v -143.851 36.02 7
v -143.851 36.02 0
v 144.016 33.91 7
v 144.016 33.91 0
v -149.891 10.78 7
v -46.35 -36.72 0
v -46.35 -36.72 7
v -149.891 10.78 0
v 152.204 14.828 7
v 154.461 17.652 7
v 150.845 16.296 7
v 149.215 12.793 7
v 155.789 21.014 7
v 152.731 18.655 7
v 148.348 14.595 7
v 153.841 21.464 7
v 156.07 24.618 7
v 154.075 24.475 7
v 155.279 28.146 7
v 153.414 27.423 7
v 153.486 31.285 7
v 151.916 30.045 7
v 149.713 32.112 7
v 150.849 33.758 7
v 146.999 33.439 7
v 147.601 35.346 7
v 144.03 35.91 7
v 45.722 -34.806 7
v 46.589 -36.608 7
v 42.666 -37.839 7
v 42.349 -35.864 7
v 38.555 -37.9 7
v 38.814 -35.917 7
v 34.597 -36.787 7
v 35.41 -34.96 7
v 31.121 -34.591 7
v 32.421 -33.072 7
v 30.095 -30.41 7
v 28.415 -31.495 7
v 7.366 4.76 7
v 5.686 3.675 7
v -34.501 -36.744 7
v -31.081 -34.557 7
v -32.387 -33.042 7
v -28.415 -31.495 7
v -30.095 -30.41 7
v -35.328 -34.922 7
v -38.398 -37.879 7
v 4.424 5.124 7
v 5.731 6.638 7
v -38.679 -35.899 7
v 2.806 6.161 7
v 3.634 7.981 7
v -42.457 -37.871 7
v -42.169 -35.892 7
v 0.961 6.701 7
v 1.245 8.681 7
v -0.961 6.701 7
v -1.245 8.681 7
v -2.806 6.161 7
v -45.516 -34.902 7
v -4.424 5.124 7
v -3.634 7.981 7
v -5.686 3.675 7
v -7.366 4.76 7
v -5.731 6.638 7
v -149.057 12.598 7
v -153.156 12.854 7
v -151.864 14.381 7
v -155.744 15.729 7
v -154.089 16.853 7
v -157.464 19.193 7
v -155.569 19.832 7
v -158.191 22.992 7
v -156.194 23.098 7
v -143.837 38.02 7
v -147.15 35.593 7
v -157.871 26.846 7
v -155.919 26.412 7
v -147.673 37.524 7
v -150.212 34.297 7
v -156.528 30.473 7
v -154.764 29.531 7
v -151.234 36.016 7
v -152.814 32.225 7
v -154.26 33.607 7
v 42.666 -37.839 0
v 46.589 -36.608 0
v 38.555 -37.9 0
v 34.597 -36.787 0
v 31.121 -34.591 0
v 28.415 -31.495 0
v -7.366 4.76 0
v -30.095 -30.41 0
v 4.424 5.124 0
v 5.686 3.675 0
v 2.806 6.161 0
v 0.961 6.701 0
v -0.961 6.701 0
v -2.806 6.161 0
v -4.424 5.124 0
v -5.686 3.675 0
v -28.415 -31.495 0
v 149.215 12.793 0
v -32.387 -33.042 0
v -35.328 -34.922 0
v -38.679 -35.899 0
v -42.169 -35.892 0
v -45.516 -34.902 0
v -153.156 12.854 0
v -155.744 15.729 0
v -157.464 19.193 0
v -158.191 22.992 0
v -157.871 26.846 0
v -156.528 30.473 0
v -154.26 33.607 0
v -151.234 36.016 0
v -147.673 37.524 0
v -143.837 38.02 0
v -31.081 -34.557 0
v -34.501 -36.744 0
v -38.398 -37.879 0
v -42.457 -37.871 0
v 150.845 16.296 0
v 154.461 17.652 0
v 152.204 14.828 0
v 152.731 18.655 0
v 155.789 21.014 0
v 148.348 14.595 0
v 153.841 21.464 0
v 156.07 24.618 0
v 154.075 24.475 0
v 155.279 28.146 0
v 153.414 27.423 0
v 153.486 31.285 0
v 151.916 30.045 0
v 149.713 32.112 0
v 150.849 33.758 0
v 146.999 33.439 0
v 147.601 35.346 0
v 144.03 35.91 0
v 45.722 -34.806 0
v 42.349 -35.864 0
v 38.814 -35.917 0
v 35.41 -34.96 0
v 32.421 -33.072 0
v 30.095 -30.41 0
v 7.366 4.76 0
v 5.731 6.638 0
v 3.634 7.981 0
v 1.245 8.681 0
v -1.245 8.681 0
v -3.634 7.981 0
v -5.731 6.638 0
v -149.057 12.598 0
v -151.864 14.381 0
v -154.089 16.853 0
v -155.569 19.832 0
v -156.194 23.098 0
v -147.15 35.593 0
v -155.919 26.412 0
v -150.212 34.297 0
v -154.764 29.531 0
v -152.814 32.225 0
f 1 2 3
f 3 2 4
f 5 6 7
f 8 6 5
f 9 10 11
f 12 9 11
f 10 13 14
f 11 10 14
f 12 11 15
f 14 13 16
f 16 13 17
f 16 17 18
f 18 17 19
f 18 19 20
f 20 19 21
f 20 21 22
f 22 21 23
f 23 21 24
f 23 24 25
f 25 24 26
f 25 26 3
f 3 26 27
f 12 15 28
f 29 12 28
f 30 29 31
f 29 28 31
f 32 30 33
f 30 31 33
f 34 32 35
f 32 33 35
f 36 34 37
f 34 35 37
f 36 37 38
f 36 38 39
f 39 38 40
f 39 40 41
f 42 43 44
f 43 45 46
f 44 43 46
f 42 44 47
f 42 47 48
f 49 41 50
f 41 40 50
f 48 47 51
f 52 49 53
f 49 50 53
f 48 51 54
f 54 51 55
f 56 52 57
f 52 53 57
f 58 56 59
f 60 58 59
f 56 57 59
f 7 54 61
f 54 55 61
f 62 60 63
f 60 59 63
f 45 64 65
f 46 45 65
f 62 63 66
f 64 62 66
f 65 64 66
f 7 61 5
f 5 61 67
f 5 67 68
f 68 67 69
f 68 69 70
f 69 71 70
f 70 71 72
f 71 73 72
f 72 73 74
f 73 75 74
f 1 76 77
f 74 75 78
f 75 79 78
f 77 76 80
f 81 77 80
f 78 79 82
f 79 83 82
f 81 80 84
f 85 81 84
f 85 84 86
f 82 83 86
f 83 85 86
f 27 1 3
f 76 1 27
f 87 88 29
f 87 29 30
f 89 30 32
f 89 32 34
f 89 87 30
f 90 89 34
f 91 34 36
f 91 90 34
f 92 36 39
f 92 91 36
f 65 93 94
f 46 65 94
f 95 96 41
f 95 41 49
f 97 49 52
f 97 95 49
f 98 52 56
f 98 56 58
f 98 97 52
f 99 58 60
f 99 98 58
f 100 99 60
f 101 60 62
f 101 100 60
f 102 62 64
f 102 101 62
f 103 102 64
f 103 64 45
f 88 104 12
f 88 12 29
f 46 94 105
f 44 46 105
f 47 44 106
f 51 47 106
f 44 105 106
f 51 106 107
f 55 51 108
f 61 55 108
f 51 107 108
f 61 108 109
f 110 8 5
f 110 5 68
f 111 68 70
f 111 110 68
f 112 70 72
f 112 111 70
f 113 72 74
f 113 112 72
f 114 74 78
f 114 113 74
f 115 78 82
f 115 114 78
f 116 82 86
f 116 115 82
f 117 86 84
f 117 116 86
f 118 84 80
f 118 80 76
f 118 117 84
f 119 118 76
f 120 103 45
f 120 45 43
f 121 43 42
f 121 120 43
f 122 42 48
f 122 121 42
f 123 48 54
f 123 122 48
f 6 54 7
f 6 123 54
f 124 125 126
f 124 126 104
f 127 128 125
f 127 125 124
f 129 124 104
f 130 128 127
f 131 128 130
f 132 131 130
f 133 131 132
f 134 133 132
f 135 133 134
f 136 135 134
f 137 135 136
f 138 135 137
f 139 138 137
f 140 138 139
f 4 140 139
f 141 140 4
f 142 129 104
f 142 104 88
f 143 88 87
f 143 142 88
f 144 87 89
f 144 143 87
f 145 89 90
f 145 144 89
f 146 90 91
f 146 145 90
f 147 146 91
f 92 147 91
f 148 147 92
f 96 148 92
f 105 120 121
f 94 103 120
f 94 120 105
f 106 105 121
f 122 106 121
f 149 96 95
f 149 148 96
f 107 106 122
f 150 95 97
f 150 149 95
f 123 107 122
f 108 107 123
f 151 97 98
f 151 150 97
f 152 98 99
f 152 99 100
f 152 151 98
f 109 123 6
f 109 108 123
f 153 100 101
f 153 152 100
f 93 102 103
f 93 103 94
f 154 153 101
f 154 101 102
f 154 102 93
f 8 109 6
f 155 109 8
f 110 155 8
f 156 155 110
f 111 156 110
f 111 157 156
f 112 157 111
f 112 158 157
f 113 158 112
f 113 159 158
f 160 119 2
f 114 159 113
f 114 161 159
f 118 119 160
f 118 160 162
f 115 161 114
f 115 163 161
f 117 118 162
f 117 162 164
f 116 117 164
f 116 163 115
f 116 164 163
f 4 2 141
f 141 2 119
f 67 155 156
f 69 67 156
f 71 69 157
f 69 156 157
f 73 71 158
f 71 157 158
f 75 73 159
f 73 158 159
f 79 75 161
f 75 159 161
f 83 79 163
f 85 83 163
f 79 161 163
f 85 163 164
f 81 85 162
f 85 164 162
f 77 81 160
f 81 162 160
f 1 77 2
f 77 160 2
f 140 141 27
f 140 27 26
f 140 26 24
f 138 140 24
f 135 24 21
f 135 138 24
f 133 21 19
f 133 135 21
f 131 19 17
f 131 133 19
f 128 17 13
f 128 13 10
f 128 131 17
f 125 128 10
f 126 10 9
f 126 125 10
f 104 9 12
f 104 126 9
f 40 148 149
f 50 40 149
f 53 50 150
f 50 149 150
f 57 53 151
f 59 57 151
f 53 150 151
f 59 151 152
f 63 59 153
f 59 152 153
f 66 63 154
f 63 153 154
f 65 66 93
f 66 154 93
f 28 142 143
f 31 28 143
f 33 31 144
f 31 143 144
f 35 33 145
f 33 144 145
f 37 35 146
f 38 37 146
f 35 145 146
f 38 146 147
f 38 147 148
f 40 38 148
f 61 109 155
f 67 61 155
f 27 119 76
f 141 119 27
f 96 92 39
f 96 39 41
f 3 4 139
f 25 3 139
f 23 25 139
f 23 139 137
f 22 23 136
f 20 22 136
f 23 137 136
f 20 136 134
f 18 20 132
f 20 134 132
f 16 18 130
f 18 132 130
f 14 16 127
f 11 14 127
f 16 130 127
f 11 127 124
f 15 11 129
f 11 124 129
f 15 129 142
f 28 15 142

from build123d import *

# Parameters (mm, degrees)
BOSS_EXTRUDE1_DEPTH = 7


with BuildPart() as part:
    # Sketch4 → Boss-Extrude1 (new body)
    with BuildSketch(Plane.XY):
        with BuildLine():
            Line((149.215463732, 12.793345832), (46.589393766, -36.607849916))
            ThreePointArc((46.589393766, -36.607849916), (36.535868579, -37.486862399), (28.414970428, -31.495448136))
            Line((28.414970428, -31.495448136), (5.685960057, 3.674609943))
            ThreePointArc((5.685960057, 3.674609943), (0, 6.77), (-5.685960057, 3.674609943))
            Line((-5.685960057, 3.674609943), (-28.414970428, -31.495448136))
            ThreePointArc((-28.414970428, -31.495448136), (-36.408809792, -37.450485427), (-46.350175166, -36.720285855))
            Line((-46.350175166, -36.720285855), (-149.891425293, 10.779714145))
            ThreePointArc((-149.891425293, 10.779714145), (-157.871281998, 26.846306071), (-143.836659858, 38.019616704))
            Line((-143.836659858, 38.019616704), (144.030375349, 35.909673379))
            ThreePointArc((144.030375349, 35.909673379), (155.806430283, 26.411409249), (149.215463732, 12.793345832))
        make_face()
        with BuildLine():
            Line((-143.851318616, 36.019670425), (144.015716591, 33.9097271))
            ThreePointArc((144.015716591, 33.9097271), (153.854920385, 25.973677464), (148.347994384, 14.59542711))
            Line((148.347994384, 14.59542711), (45.721924419, -34.805768638))
            ThreePointArc((45.721924419, -34.805768638), (37.077442705, -35.561583857), (30.094722291, -30.409891285))
            Line((30.094722291, -30.409891285), (7.36571192, 4.760166794))
            ThreePointArc((7.36571192, 4.760166794), (0, 8.77), (-7.36571192, 4.760166794))
            Line((-7.36571192, 4.760166794), (-30.094722291, -30.409891285))
            ThreePointArc((-30.094722291, -30.409891285), (-36.968191738, -35.530305269), (-45.516233303, -34.902446212))
            Line((-45.516233303, -34.902446212), (-149.05748343, 12.597553788))
            ThreePointArc((-149.05748343, 12.597553788), (-155.918929945, 26.412345864), (-143.851318616, 36.019670425))
        make_face(mode=Mode.SUBTRACT)
    extrude(amount=BOSS_EXTRUDE1_DEPTH)


solid = part.part
